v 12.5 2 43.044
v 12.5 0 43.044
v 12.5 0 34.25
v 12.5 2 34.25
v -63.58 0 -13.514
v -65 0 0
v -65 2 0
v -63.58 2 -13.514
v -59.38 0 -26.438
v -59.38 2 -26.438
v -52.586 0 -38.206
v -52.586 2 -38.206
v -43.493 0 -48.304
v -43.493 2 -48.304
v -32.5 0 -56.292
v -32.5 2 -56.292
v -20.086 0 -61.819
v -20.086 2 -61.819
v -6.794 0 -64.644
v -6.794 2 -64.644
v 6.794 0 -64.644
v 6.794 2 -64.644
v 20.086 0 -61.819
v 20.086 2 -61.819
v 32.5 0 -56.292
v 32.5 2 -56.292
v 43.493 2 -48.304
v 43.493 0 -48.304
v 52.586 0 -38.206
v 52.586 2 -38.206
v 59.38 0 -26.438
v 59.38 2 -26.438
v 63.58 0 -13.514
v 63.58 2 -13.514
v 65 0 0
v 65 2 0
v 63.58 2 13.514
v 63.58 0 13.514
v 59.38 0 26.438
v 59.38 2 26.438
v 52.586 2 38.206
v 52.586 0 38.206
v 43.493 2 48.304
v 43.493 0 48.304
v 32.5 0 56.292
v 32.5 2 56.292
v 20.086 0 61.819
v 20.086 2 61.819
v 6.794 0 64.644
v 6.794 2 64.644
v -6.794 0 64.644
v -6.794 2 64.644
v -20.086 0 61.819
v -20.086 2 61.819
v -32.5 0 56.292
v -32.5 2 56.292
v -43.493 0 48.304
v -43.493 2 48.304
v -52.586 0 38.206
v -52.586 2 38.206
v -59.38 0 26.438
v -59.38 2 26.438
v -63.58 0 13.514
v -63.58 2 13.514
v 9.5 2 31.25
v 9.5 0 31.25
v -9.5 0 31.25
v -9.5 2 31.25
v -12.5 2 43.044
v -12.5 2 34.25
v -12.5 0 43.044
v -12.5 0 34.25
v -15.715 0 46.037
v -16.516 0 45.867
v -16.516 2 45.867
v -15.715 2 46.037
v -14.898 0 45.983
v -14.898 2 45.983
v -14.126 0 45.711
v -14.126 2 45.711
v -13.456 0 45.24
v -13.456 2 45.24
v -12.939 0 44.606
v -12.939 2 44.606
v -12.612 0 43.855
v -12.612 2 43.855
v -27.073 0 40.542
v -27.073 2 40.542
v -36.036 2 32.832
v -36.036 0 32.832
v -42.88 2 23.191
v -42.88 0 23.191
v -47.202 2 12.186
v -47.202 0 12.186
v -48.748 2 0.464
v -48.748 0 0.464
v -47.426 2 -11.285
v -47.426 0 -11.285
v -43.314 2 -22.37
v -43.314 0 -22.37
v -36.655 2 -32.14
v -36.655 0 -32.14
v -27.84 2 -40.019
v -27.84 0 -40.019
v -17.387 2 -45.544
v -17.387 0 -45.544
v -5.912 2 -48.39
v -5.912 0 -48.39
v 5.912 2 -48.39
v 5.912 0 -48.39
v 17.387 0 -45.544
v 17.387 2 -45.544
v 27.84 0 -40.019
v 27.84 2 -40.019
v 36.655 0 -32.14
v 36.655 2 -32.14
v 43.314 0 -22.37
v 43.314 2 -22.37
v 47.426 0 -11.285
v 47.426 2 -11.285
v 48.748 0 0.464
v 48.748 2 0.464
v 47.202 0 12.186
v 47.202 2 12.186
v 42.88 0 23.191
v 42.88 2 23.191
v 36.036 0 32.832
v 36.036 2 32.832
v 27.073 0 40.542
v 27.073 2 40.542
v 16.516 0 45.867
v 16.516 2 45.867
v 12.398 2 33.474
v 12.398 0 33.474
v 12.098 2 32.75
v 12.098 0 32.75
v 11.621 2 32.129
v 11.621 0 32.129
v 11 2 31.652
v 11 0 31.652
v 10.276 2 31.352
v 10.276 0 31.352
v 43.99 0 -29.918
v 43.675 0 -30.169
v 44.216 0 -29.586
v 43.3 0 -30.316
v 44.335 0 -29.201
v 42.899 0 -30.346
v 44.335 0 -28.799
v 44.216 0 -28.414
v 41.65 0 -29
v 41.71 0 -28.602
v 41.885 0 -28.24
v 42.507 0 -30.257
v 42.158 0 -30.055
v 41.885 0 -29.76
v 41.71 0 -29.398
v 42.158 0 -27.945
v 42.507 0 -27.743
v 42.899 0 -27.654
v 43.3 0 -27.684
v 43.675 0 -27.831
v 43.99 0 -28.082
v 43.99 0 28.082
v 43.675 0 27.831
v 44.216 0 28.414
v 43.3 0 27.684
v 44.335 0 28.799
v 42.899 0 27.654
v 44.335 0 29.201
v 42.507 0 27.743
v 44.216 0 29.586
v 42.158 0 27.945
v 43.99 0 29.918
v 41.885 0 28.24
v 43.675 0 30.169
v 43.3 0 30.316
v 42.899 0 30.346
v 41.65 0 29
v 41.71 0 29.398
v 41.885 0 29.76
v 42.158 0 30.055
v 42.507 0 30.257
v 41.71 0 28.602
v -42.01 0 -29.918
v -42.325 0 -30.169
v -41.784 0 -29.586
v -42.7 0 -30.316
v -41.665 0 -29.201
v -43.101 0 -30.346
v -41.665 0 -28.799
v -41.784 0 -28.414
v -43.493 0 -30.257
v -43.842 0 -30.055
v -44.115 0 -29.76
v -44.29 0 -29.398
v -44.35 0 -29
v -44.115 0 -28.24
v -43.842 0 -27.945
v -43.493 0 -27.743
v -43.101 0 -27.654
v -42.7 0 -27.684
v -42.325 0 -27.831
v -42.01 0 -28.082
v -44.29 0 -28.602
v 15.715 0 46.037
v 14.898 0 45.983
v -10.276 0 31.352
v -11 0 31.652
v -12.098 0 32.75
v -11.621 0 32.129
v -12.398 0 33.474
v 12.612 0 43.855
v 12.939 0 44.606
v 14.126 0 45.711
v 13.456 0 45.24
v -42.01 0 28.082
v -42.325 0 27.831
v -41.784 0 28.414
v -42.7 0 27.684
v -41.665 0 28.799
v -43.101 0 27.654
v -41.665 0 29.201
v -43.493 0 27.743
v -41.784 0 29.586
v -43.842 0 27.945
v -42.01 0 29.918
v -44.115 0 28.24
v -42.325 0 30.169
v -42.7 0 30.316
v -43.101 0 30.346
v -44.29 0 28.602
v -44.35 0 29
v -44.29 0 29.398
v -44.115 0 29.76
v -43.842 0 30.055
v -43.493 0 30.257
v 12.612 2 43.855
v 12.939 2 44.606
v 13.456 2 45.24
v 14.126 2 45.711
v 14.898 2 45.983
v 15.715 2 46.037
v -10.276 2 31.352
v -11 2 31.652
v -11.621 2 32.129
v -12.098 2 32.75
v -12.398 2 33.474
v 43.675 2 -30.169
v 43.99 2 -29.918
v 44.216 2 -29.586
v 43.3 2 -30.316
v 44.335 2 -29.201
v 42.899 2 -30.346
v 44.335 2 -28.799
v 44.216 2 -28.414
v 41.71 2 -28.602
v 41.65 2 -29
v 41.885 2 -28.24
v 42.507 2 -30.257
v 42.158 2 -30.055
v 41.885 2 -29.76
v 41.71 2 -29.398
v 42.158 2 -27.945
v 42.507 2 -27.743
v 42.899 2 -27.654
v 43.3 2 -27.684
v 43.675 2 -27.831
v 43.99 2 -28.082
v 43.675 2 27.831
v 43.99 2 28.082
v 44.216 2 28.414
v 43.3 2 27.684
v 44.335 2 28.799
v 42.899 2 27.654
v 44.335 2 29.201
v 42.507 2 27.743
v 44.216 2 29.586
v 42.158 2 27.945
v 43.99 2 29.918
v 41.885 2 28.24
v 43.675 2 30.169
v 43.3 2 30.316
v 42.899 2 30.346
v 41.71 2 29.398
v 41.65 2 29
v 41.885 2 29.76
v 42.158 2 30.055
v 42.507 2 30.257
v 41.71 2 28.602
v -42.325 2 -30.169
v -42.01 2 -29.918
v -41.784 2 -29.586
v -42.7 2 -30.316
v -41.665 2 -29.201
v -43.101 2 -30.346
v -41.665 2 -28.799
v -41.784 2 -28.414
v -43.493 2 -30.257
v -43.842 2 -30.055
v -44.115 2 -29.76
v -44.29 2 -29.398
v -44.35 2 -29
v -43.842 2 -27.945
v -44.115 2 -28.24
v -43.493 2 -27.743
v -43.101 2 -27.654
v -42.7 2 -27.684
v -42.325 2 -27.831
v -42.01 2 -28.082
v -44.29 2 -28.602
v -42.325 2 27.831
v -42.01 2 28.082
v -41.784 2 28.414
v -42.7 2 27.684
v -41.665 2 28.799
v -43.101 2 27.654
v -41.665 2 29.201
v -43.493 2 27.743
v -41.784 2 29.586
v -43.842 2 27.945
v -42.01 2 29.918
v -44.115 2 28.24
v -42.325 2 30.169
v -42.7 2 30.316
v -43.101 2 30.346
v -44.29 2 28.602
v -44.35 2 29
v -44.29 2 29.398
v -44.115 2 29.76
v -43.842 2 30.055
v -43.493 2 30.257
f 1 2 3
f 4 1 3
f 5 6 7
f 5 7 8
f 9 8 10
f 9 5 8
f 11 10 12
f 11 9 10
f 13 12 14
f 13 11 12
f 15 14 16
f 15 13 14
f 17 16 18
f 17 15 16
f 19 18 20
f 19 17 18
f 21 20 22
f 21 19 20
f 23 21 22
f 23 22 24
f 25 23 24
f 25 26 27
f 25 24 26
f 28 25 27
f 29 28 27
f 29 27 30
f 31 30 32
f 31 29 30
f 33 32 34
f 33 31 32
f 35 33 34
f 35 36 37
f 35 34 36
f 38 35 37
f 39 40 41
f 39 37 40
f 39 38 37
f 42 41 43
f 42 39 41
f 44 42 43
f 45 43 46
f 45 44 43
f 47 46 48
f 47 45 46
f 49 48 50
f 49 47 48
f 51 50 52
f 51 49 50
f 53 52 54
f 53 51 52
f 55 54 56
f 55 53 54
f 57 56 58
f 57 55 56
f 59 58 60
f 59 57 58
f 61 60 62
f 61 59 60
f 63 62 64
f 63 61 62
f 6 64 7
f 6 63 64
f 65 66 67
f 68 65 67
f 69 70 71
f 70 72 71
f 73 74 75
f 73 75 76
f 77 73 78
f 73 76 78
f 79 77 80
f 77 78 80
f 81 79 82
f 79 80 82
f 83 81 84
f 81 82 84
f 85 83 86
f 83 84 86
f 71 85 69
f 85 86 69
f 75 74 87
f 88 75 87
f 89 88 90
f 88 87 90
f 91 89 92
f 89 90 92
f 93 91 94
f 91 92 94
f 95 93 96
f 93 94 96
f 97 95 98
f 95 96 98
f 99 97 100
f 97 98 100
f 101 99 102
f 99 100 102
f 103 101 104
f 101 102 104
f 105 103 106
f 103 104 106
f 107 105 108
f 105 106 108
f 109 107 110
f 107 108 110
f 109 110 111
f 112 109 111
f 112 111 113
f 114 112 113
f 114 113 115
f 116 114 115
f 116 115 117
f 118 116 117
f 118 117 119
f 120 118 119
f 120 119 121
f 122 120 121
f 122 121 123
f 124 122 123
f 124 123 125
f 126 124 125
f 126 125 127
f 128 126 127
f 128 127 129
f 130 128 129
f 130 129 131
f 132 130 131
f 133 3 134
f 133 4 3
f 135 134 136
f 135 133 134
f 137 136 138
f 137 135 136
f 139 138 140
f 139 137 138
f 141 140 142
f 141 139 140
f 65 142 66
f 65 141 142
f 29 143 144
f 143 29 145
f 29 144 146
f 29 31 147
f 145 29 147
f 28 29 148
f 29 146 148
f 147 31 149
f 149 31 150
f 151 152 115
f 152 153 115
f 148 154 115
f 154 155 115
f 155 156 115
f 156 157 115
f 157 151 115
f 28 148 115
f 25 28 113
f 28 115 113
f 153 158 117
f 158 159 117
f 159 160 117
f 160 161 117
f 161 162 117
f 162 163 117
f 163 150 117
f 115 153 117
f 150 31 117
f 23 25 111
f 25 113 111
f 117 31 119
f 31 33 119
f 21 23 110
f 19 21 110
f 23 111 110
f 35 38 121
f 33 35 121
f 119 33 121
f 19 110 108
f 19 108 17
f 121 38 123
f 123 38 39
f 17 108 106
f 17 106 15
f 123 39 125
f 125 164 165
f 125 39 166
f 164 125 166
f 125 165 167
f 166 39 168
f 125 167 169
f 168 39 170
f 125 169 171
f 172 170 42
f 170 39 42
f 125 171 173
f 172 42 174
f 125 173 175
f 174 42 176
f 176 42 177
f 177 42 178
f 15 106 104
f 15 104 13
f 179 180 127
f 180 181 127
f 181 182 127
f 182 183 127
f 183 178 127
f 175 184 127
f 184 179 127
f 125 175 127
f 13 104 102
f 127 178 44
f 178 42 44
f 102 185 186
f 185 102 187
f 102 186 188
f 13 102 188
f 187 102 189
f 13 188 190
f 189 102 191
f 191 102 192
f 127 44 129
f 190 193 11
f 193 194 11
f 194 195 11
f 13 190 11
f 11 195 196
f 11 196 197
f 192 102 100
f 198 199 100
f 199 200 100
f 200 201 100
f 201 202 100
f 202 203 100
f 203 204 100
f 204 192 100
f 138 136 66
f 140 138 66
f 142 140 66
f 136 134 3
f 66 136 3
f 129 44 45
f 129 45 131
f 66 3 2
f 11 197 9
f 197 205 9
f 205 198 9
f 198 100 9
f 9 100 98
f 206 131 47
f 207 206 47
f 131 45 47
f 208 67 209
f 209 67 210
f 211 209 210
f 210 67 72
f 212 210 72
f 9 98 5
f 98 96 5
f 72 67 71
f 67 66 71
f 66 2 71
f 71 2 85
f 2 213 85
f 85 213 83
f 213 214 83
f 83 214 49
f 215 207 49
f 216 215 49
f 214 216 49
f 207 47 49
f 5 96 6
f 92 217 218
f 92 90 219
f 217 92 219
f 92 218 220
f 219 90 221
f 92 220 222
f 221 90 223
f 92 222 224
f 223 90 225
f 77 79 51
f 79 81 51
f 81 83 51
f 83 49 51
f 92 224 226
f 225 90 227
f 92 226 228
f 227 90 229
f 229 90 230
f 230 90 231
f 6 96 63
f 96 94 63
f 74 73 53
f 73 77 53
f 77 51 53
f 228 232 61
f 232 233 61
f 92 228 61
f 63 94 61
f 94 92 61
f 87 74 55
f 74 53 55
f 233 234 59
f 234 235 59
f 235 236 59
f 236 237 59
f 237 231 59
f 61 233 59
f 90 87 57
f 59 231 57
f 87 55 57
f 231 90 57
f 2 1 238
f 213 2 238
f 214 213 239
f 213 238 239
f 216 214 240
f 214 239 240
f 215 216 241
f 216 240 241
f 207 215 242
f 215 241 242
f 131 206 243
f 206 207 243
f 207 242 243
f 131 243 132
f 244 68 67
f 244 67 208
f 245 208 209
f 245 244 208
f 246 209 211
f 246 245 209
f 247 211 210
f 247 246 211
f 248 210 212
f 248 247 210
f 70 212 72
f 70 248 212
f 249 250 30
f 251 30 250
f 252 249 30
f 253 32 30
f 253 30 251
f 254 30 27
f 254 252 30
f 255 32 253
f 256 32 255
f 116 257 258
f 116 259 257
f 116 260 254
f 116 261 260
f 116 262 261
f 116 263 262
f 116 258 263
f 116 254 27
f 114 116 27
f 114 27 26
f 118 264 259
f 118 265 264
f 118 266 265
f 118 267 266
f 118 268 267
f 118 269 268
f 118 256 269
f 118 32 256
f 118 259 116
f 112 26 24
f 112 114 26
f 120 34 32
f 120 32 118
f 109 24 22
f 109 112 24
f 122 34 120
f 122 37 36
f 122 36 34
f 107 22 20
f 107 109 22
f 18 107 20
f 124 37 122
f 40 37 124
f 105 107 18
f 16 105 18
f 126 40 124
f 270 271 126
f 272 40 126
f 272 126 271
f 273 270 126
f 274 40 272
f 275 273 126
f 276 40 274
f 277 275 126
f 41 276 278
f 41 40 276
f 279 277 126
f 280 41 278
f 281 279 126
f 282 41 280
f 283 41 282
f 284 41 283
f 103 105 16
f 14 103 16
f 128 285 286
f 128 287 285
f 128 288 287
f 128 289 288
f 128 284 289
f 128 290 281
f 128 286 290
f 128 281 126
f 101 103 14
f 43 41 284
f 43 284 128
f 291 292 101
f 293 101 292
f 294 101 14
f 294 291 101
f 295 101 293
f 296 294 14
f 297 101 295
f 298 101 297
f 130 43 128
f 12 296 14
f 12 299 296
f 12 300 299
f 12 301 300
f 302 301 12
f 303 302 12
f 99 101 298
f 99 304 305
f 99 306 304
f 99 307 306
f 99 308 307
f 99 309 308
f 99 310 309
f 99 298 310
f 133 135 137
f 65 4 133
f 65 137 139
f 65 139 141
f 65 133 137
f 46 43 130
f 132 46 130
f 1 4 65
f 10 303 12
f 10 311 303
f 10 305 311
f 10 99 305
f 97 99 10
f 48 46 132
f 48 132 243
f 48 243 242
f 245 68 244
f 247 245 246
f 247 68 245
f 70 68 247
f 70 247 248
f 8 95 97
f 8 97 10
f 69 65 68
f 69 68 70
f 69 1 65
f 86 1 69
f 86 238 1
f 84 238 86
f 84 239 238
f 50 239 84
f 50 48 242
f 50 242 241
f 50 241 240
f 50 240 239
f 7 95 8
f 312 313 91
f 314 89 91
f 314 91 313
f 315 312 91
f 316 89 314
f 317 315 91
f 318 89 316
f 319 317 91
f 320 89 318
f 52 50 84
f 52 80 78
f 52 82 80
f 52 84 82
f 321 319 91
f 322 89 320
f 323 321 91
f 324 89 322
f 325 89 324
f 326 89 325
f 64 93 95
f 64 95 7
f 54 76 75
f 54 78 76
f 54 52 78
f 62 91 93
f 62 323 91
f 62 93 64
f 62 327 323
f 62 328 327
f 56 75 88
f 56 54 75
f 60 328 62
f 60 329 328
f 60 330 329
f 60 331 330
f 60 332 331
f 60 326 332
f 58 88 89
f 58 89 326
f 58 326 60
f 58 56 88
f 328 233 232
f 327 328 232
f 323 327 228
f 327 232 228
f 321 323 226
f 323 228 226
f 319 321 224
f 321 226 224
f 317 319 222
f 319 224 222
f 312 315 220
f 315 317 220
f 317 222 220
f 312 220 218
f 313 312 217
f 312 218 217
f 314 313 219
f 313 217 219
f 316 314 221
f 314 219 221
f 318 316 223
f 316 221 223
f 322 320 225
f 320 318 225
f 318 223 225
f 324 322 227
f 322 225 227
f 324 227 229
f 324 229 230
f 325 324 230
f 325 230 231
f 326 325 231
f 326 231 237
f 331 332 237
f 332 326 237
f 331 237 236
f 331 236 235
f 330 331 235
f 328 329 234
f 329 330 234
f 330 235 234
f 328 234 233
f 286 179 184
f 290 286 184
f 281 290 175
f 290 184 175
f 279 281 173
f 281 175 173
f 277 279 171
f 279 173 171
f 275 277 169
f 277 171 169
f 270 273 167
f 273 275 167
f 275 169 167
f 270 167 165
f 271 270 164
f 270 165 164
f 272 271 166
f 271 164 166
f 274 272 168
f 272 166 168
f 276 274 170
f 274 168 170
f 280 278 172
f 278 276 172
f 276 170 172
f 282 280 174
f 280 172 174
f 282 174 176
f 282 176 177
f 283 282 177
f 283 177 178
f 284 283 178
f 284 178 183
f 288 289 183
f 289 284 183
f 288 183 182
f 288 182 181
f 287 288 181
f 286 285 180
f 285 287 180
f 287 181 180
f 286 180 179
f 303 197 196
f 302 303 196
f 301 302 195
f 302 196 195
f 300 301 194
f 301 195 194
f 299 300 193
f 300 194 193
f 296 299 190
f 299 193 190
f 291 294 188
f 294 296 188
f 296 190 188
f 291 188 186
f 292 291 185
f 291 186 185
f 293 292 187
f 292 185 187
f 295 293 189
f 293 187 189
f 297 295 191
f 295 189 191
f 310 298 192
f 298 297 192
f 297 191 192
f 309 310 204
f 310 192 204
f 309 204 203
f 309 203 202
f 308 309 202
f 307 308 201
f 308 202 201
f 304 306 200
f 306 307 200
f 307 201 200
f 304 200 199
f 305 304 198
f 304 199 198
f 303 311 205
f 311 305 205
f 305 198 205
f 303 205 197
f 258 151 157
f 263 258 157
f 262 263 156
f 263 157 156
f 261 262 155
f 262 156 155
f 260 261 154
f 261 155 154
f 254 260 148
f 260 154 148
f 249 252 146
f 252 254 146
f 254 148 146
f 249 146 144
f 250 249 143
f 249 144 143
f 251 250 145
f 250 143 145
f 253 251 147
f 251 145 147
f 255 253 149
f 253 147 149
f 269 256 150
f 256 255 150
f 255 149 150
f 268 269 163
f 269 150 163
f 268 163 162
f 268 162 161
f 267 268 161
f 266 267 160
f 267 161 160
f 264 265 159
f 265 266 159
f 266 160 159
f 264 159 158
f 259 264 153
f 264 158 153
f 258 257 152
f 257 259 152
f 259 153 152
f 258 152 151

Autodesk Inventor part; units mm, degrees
ref_plane "YZ Plane" through (0, 0, 0) normal (1, 0, 0) x (0, 1, 0)
ref_plane "XZ Plane" through (0, 0, 0) normal (0, 1, 0) x (-1, 0, 0)
ref_plane "XY Plane" through (0, 0, 0) normal (0, 0, 1) x (1, 0, 0)
sketch "Sketch1" plane through (0, 0, 0) normal (0, 1, 0) x (-1, 0, 0)
  circle A0 centre (0, 0) radius 65
  line L0 (0, 0) -> (65, 0) construction
  line L1 (0, 0) -> (0, -65) construction
  circle A1 centre (0, 0) radius 48.75
  line L2 (0, 48.75) -> (0, 31.25)
  line L3 (0, 31.25) -> (-37.4166, 31.25)
  line L4 (0, 31.25) -> (37.4166, 31.25)
  line L5 (0, 0) -> (65, 0) construction
  line L6 (0, 0) -> (-48.75, 0) construction
  circle A2 centre (29, 43) radius 1.35
  circle A3 centre (-29, 43) radius 1.35
  circle A4 centre (29, -43) radius 1.35
  circle A5 centre (-29, -43) radius 1.35
  circle A6 centre (-43, 29) radius 1.35
  circle A7 centre (-43, -29) radius 1.35
  circle A8 centre (43, 29) radius 1.35
  circle A9 centre (43, -29) radius 1.35
  circle A10 centre (-29, -43) radius 1.35
  circle A11 centre (29, -43) radius 1.35
  circle A12 centre (-29, 43) radius 1.35
  circle A13 centre (29, 43) radius 1.35
  circle A14 centre (43, -29) radius 1.35
  circle A15 centre (43, 29) radius 1.35
  circle A16 centre (-43, -29) radius 1.35
  circle A17 centre (-43, 29) radius 1.35
  line L7 (12.5, 48.75) -> (-12.5, 48.75)
  line L8 (-12.5, 48.75) -> (-12.5, 31.25)
  line L9 (-12.5, 31.25) -> (12.5, 31.25)
  line L10 (12.5, 31.25) -> (12.5, 48.75)
  line L11 (12.5, 48.75) -> (-12.5, 31.25) construction
  line L12 (-12.5, 48.75) -> (12.5, 31.25) construction
  point P0 (0, -48.75)
  point P1 (0, 40)
  point P2 (-12.5, 47.1202)
  point P3 (12.5, 47.1202)
  dimension "d0" = 130
  dimension "d18" = 97.5
  dimension "d21" = 62.5
  dimension "d29" = 86
  dimension "d30" = 29
  dimension "d31" = 2.7
  dimension "d47" = 360
  dimension "d49" = 25
extrude "Extrusion1" add sketch "Sketch1" along normal blind 2 contours A0 | L10 L4 L2 A1 | A1 L7 L10 | L8 L7 A1 | A1 L2 L3 L8 | A2 | A3 | A4 | A5
sketch "Sketch2" plane through (0, 0, 0) normal (0, -1, 0) x (1, 0, 0)
  circle A0 centre (0, 0) radius 65 construction
  line L0 (-4, 55) -> (4, 55)
  line L1 (4, 55) -> (4, 61)
  line L2 (-4, 61) -> (-4, 55)
  line L3 (-4, 55) -> (4, 61) construction
  line L4 (4, 55) -> (-4, 61) construction
  line L5 (0, 0) -> (0, 71.2779) construction
  arc A1 (4, 61) -> (-4, 61) centre (0, 61) ccw
  line L6 (-24.7431, 49.2826) -> (-17.3521, 52.3441)
  line L7 (-17.3521, 52.3441) -> (-19.6482, 57.8874)
  line L8 (-27.0392, 54.8259) -> (-24.7431, 49.2826)
  line L9 (-24.7431, 49.2826) -> (-19.6482, 57.8874) construction
  line L10 (-17.3521, 52.3441) -> (-27.0392, 54.8259) construction
  arc A2 (-19.6482, 57.8874) -> (-27.0392, 54.8259) centre (-23.3437, 56.3567) ccw
  line L11 (-41.7193, 36.0624) -> (-36.0624, 41.7193)
  line L12 (-36.0624, 41.7193) -> (-40.3051, 45.9619)
  line L13 (-45.9619, 40.3051) -> (-41.7193, 36.0624)
  line L14 (-41.7193, 36.0624) -> (-40.3051, 45.9619) construction
  line L15 (-36.0624, 41.7193) -> (-45.9619, 40.3051) construction
  arc A3 (-40.3051, 45.9619) -> (-45.9619, 40.3051) centre (-43.1335, 43.1335) ccw
  line L16 (-52.3441, 17.3521) -> (-49.2826, 24.7431)
  line L17 (-49.2826, 24.7431) -> (-54.8259, 27.0392)
  line L18 (-57.8874, 19.6482) -> (-52.3441, 17.3521)
  line L19 (-52.3441, 17.3521) -> (-54.8259, 27.0392) construction
  line L20 (-49.2826, 24.7431) -> (-57.8874, 19.6482) construction
  arc A4 (-54.8259, 27.0392) -> (-57.8874, 19.6482) centre (-56.3567, 23.3437) ccw
  line L21 (-55, -4) -> (-55, 4)
  line L22 (-55, 4) -> (-61, 4)
  line L23 (-61, -4) -> (-55, -4)
  line L24 (-55, -4) -> (-61, 4) construction
  line L25 (-55, 4) -> (-61, -4) construction
  arc A5 (-61, 4) -> (-61, -4) centre (-61, 0) ccw
  line L26 (-49.2826, -24.7431) -> (-52.3441, -17.3521)
  line L27 (-52.3441, -17.3521) -> (-57.8874, -19.6482)
  line L28 (-54.8259, -27.0392) -> (-49.2826, -24.7431)
  line L29 (-49.2826, -24.7431) -> (-57.8874, -19.6482) construction
  line L30 (-52.3441, -17.3521) -> (-54.8259, -27.0392) construction
  arc A6 (-57.8874, -19.6482) -> (-54.8259, -27.0392) centre (-56.3567, -23.3437) ccw
  line L31 (-36.0624, -41.7193) -> (-41.7193, -36.0624)
  line L32 (-41.7193, -36.0624) -> (-45.9619, -40.3051)
  line L33 (-40.3051, -45.9619) -> (-36.0624, -41.7193)
  line L34 (-36.0624, -41.7193) -> (-45.9619, -40.3051) construction
  line L35 (-41.7193, -36.0624) -> (-40.3051, -45.9619) construction
  arc A7 (-45.9619, -40.3051) -> (-40.3051, -45.9619) centre (-43.1335, -43.1335) ccw
  line L36 (-17.3521, -52.3441) -> (-24.7431, -49.2826)
  line L37 (-24.7431, -49.2826) -> (-27.0392, -54.8259)
  line L38 (-19.6482, -57.8874) -> (-17.3521, -52.3441)
  line L39 (-17.3521, -52.3441) -> (-27.0392, -54.8259) construction
  line L40 (-24.7431, -49.2826) -> (-19.6482, -57.8874) construction
  arc A8 (-27.0392, -54.8259) -> (-19.6482, -57.8874) centre (-23.3437, -56.3567) ccw
  line L41 (4, -55) -> (-4, -55)
  line L42 (-4, -55) -> (-4, -61)
  line L43 (4, -61) -> (4, -55)
  line L44 (4, -55) -> (-4, -61) construction
  line L45 (-4, -55) -> (4, -61) construction
  arc A9 (-4, -61) -> (4, -61) centre (0, -61) ccw
  line L46 (24.7431, -49.2826) -> (17.3521, -52.3441)
  line L47 (17.3521, -52.3441) -> (19.6482, -57.8874)
  line L48 (27.0392, -54.8259) -> (24.7431, -49.2826)
  line L49 (24.7431, -49.2826) -> (19.6482, -57.8874) construction
  line L50 (17.3521, -52.3441) -> (27.0392, -54.8259) construction
  arc A10 (19.6482, -57.8874) -> (27.0392, -54.8259) centre (23.3437, -56.3567) ccw
  line L51 (41.7193, -36.0624) -> (36.0624, -41.7193)
  line L52 (36.0624, -41.7193) -> (40.3051, -45.9619)
  line L53 (45.9619, -40.3051) -> (41.7193, -36.0624)
  line L54 (41.7193, -36.0624) -> (40.3051, -45.9619) construction
  line L55 (36.0624, -41.7193) -> (45.9619, -40.3051) construction
  arc A11 (40.3051, -45.9619) -> (45.9619, -40.3051) centre (43.1335, -43.1335) ccw
  line L56 (52.3441, -17.3521) -> (49.2826, -24.7431)
  line L57 (49.2826, -24.7431) -> (54.8259, -27.0392)
  line L58 (57.8874, -19.6482) -> (52.3441, -17.3521)
  line L59 (52.3441, -17.3521) -> (54.8259, -27.0392) construction
  line L60 (49.2826, -24.7431) -> (57.8874, -19.6482) construction
  arc A12 (54.8259, -27.0392) -> (57.8874, -19.6482) centre (56.3567, -23.3437) ccw
  line L61 (55, 4) -> (55, -4)
  line L62 (55, -4) -> (61, -4)
  line L63 (61, 4) -> (55, 4)
  line L64 (55, 4) -> (61, -4) construction
  line L65 (55, -4) -> (61, 4) construction
  arc A13 (61, -4) -> (61, 4) centre (61, 0) ccw
  line L66 (49.2826, 24.7431) -> (52.3441, 17.3521)
  line L67 (52.3441, 17.3521) -> (57.8874, 19.6482)
  line L68 (54.8259, 27.0392) -> (49.2826, 24.7431)
  line L69 (49.2826, 24.7431) -> (57.8874, 19.6482) construction
  line L70 (52.3441, 17.3521) -> (54.8259, 27.0392) construction
  arc A14 (57.8874, 19.6482) -> (54.8259, 27.0392) centre (56.3567, 23.3437) ccw
  line L71 (36.0624, 41.7193) -> (41.7193, 36.0624)
  line L72 (41.7193, 36.0624) -> (45.9619, 40.3051)
  line L73 (40.3051, 45.9619) -> (36.0624, 41.7193)
  line L74 (36.0624, 41.7193) -> (45.9619, 40.3051) construction
  line L75 (41.7193, 36.0624) -> (40.3051, 45.9619) construction
  arc A15 (45.9619, 40.3051) -> (40.3051, 45.9619) centre (43.1335, 43.1335) ccw
  line L76 (17.3521, 52.3441) -> (24.7431, 49.2826)
  line L77 (24.7431, 49.2826) -> (27.0392, 54.8259)
  line L78 (19.6482, 57.8874) -> (17.3521, 52.3441)
  line L79 (17.3521, 52.3441) -> (27.0392, 54.8259) construction
  line L80 (24.7431, 49.2826) -> (19.6482, 57.8874) construction
  arc A16 (27.0392, 54.8259) -> (19.6482, 57.8874) centre (23.3437, 56.3567) ccw
  point P0 (0, 58)
  point P1 (-22.1956, 53.585)
  point P2 (-41.0122, 41.0122)
  point P3 (-53.585, 22.1956)
  point P4 (-58, 0)
  point P5 (-53.585, -22.1956)
  point P6 (-41.0122, -41.0122)
  point P7 (-22.1956, -53.585)
  point P8 (0, -58)
  point P9 (22.1956, -53.585)
  point P10 (41.0122, -41.0122)
  point P11 (53.585, -22.1956)
  point P12 (58, 0)
  point P13 (53.585, 22.1956)
  point P14 (41.0122, 41.0122)
  point P15 (22.1956, 53.585)
  dimension "d34" = 8
  dimension "d35" = 6
  dimension "d38" = 4
  dimension "d39" = 55
  dimension "d42" = 360
extrude "Extrusion2" [suppressed]
fillet "Fillet1" radius 3 4 edges at (12.5, 1, 47.1202) (12.5, 1, 31.25) (-12.5, 1, 31.25) (-12.5, 1, 47.1202)
properties part number "IR Board"
